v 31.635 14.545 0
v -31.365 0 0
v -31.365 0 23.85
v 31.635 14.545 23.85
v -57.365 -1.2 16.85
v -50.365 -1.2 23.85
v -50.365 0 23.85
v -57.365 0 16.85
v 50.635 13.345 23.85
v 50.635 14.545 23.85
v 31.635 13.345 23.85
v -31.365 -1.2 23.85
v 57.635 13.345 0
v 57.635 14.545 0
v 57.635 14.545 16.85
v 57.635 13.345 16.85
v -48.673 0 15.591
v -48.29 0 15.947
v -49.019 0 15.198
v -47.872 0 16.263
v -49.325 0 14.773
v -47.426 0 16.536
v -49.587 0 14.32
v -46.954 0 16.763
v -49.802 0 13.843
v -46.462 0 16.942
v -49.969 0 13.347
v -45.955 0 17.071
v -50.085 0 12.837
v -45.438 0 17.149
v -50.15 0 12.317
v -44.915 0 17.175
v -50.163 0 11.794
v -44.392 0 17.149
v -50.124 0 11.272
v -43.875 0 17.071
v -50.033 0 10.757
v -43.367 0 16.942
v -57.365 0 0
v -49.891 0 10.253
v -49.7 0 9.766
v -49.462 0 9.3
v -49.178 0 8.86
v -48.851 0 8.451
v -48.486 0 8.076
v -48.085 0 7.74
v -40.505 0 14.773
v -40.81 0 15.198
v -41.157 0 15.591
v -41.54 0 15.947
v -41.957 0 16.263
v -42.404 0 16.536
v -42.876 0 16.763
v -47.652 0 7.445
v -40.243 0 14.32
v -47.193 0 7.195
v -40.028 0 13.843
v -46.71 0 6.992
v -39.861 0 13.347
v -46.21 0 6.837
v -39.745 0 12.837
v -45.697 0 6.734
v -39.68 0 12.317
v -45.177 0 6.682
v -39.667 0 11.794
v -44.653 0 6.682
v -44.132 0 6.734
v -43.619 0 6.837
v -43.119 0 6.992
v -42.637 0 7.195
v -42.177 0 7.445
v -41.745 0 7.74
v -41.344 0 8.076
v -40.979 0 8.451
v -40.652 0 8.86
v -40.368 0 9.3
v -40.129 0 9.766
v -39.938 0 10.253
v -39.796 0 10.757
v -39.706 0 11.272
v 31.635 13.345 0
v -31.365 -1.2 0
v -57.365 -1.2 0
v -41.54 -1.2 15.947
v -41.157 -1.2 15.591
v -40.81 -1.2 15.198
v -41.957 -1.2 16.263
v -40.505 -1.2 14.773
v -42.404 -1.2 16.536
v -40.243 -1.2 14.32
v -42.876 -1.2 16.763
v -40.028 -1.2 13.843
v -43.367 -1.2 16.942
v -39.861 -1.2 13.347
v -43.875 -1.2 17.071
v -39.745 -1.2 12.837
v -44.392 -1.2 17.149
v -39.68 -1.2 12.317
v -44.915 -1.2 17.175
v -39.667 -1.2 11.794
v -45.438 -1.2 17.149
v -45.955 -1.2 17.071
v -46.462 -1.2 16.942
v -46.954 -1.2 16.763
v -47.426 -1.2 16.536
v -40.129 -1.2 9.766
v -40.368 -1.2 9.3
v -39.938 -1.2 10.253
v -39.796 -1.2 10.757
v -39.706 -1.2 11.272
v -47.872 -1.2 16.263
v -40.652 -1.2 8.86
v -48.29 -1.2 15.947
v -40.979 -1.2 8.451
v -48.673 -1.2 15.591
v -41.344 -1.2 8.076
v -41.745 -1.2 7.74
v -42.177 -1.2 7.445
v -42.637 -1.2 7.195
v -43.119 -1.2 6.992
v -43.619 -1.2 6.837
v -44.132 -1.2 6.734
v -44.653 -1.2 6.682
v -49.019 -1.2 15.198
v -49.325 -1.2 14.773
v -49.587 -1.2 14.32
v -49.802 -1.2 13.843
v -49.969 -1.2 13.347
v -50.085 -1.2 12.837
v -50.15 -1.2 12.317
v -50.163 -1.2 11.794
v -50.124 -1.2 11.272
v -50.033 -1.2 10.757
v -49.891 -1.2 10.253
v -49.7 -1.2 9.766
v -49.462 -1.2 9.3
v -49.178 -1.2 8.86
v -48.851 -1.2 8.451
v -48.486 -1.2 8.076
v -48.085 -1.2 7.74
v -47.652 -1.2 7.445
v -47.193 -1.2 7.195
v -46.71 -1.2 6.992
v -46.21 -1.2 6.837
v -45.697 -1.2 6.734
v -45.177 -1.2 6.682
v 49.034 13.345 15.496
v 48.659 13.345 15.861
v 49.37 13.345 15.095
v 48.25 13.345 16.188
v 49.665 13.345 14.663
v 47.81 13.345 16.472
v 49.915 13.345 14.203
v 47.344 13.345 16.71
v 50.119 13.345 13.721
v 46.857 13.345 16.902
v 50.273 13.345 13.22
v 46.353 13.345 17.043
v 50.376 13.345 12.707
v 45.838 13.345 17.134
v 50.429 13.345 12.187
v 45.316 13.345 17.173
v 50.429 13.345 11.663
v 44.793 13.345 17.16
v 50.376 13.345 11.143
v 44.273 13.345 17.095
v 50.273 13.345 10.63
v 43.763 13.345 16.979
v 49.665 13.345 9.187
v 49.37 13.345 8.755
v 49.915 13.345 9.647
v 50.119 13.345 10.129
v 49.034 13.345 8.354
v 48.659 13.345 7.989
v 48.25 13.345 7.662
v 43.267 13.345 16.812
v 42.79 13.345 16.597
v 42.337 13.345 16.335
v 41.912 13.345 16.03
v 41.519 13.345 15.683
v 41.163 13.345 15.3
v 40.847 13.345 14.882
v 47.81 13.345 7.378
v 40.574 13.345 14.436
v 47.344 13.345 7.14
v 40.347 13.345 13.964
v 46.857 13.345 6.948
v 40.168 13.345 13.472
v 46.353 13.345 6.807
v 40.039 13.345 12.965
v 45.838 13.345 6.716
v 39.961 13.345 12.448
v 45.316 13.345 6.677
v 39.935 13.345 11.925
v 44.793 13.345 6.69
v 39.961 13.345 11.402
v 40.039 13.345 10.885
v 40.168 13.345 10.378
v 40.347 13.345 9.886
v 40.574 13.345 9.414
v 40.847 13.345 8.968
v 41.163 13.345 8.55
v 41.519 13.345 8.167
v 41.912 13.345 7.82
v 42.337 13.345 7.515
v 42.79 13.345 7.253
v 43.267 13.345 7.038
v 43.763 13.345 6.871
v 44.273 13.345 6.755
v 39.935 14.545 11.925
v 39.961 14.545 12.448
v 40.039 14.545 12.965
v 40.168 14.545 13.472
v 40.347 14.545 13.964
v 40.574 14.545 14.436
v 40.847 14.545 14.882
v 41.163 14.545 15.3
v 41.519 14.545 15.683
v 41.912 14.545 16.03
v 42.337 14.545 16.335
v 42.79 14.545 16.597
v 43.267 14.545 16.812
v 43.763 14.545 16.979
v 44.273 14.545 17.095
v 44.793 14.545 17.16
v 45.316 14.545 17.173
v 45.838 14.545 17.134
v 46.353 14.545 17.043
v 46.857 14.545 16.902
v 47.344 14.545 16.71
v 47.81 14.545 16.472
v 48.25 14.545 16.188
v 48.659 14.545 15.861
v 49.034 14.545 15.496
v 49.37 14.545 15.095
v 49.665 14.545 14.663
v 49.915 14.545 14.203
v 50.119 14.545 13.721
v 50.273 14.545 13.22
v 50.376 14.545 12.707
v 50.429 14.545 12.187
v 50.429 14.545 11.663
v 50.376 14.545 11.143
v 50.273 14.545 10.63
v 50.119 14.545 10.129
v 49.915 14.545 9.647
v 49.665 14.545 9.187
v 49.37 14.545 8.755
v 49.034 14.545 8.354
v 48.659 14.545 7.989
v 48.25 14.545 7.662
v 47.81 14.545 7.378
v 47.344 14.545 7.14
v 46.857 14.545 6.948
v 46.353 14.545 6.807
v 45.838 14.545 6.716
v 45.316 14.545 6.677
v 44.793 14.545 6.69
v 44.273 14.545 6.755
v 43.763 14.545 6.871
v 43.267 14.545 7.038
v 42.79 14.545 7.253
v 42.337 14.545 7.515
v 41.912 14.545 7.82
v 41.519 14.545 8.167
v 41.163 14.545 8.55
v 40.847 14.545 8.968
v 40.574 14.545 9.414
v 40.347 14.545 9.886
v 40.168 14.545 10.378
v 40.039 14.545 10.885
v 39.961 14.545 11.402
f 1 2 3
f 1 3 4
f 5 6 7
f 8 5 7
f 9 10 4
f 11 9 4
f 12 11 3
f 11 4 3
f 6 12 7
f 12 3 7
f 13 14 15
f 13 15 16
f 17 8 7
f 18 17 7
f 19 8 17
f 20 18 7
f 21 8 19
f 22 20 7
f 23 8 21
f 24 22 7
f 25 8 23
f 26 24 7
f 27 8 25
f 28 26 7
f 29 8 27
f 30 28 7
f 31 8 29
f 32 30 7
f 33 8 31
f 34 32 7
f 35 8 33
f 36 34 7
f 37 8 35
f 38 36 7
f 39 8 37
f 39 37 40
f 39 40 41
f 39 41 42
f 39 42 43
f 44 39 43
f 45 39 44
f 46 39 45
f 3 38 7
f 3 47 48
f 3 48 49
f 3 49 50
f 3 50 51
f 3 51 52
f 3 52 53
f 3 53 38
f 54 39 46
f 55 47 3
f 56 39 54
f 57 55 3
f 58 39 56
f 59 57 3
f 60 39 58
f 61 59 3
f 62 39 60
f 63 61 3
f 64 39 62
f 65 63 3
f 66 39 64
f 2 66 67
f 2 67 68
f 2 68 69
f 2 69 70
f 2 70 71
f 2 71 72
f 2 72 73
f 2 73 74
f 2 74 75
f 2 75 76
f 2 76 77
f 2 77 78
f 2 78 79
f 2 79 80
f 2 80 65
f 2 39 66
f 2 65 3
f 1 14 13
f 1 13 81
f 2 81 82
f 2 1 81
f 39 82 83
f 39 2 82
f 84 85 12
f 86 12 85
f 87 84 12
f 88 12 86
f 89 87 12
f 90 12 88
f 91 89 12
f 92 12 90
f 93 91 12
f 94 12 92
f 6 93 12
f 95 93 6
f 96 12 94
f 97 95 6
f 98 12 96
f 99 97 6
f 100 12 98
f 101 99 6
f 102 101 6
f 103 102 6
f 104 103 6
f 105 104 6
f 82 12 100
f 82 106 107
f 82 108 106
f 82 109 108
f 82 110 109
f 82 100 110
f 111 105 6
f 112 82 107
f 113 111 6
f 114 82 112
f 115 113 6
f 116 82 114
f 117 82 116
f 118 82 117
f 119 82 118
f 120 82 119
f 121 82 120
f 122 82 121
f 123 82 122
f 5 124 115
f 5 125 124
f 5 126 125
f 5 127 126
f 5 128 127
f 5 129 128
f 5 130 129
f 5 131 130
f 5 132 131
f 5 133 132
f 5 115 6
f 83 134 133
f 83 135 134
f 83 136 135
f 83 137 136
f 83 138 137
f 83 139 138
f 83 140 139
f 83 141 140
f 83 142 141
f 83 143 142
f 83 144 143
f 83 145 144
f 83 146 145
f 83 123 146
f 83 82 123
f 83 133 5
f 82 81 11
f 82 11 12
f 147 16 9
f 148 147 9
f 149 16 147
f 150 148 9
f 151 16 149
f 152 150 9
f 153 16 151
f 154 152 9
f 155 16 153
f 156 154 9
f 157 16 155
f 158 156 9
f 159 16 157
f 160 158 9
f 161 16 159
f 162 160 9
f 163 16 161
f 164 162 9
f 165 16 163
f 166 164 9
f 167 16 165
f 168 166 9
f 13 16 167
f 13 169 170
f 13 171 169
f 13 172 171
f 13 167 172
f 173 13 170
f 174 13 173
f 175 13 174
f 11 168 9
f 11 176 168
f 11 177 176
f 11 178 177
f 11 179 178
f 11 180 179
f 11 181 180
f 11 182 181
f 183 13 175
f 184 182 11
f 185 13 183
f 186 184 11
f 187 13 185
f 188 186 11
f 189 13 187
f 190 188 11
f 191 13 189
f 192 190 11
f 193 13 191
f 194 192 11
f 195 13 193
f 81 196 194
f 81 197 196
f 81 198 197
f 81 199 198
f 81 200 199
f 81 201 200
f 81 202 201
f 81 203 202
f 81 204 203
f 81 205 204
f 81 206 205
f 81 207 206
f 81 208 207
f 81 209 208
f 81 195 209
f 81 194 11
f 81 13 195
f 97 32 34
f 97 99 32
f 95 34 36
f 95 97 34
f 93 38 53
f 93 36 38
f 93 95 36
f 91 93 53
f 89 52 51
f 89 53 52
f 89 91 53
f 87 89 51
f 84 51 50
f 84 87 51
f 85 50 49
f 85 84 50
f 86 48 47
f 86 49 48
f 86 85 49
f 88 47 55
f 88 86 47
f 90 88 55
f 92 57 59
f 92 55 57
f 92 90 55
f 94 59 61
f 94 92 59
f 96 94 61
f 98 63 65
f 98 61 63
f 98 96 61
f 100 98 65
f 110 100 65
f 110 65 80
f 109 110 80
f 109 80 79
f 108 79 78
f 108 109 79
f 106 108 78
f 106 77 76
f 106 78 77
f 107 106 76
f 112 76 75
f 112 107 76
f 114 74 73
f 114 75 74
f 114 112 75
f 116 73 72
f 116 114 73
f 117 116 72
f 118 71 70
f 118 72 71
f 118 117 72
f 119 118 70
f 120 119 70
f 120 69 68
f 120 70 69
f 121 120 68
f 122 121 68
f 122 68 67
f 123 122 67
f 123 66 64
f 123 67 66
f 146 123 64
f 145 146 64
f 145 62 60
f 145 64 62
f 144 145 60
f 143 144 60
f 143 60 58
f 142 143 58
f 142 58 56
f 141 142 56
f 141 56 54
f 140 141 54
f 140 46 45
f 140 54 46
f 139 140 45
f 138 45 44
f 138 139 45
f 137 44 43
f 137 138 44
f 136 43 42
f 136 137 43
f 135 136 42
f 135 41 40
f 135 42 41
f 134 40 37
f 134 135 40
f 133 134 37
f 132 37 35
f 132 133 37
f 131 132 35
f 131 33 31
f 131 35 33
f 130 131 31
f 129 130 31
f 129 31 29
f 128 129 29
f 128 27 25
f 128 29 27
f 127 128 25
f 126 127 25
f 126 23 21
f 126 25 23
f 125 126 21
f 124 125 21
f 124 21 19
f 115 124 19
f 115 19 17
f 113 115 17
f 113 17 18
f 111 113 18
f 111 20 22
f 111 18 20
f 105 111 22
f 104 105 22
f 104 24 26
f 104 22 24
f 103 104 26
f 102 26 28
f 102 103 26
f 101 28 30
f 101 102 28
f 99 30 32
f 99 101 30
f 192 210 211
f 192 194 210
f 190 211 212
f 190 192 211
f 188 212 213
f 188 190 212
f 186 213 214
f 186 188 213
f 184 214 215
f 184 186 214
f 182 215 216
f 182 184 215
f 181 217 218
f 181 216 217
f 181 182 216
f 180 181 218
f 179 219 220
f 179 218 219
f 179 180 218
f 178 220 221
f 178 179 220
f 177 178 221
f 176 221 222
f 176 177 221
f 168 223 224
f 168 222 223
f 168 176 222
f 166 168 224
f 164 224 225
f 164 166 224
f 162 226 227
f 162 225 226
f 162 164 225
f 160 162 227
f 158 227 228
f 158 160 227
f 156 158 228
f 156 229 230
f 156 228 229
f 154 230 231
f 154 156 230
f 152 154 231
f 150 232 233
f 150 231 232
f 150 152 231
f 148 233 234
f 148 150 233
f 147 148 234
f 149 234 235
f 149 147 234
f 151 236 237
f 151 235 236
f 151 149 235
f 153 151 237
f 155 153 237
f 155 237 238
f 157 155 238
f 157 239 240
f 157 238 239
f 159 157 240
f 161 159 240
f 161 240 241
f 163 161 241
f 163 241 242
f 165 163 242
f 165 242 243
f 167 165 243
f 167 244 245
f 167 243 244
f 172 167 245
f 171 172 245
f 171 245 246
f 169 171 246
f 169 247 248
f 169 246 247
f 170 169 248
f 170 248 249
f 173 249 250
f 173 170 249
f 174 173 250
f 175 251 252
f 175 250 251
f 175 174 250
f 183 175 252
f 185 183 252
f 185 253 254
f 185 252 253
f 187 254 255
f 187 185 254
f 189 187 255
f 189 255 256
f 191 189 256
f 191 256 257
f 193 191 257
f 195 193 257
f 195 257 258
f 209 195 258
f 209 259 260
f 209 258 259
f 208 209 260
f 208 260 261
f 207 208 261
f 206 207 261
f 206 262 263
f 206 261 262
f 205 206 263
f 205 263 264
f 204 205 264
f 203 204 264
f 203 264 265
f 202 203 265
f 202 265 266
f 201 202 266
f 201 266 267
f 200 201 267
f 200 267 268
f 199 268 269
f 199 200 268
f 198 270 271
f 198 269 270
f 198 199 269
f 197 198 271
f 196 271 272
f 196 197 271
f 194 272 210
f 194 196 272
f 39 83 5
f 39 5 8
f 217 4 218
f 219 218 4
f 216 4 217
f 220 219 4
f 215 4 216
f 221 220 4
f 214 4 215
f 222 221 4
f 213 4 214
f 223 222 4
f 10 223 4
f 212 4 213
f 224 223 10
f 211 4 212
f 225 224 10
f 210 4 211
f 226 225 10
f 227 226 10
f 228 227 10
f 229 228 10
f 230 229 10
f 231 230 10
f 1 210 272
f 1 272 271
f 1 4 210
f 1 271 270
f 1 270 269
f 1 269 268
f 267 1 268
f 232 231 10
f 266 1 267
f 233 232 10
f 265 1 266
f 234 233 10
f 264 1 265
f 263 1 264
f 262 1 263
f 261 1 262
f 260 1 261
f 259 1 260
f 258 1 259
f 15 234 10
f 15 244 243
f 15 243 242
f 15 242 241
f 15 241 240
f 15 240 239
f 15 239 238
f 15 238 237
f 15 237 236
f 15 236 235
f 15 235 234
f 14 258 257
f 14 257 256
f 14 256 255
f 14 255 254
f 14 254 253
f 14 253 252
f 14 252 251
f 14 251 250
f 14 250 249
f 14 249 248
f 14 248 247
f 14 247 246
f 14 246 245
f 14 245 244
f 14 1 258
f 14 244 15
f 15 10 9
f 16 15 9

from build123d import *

# Parameters (mm, degrees)
RESSALTO_EXTRUS_O1_DEPTH   = 23.85
CHANFRO1_SIZE              = 7
CORTE_EXTRUS_O1_DEPTH      = 65.048254304
CORTE_EXTRUS_O1_DEPTH_BACK = 65.048254304
ESBO_O2_R                  = 5.25


with BuildPart() as part:
    # Esboço1 → Ressalto-extrusão1 (new body)
    with BuildSketch(Plane.XY):
        Polygon((-57.364870118, 0), (-31.364870118, 0), (31.635129882, 14.544696041), (57.635129882, 14.544696041), (57.635129882, 13.344696041), (31.635129882, 13.344696041), (-31.364870118, -1.2), (-57.364870118, -1.2), align=None)
    extrude(amount=RESSALTO_EXTRUS_O1_DEPTH)

    # Chanfro1
    chanfro1_edges = [part.edges().sort_by_distance(p)[0] for p in [
        (57.635129882, 13.944696041, 23.85),
        (-57.364870118, -0.6, 23.85),
    ]]
    chamfer(chanfro1_edges, length=CHANFRO1_SIZE)

    # Esboço2 → Corte-extrusão1 (cut, two sides: drawn at the far end of the back side and taken through both)
    with BuildSketch(Plane(origin=(0, 0, 0), x_dir=(1, 0, 0), z_dir=(0, 1, 0)).offset(-CORTE_EXTRUS_O1_DEPTH_BACK)):
        with Locations(Location((-44.914870118, -11.925, 0), (0, 0, 270))):
            Circle(ESBO_O2_R)
        with Locations(Location((45.185129882, -11.925, 0), (0, 0, 180))):
            Circle(ESBO_O2_R)
    extrude(amount=CORTE_EXTRUS_O1_DEPTH + CORTE_EXTRUS_O1_DEPTH_BACK, mode=Mode.SUBTRACT)


solid = part.part
